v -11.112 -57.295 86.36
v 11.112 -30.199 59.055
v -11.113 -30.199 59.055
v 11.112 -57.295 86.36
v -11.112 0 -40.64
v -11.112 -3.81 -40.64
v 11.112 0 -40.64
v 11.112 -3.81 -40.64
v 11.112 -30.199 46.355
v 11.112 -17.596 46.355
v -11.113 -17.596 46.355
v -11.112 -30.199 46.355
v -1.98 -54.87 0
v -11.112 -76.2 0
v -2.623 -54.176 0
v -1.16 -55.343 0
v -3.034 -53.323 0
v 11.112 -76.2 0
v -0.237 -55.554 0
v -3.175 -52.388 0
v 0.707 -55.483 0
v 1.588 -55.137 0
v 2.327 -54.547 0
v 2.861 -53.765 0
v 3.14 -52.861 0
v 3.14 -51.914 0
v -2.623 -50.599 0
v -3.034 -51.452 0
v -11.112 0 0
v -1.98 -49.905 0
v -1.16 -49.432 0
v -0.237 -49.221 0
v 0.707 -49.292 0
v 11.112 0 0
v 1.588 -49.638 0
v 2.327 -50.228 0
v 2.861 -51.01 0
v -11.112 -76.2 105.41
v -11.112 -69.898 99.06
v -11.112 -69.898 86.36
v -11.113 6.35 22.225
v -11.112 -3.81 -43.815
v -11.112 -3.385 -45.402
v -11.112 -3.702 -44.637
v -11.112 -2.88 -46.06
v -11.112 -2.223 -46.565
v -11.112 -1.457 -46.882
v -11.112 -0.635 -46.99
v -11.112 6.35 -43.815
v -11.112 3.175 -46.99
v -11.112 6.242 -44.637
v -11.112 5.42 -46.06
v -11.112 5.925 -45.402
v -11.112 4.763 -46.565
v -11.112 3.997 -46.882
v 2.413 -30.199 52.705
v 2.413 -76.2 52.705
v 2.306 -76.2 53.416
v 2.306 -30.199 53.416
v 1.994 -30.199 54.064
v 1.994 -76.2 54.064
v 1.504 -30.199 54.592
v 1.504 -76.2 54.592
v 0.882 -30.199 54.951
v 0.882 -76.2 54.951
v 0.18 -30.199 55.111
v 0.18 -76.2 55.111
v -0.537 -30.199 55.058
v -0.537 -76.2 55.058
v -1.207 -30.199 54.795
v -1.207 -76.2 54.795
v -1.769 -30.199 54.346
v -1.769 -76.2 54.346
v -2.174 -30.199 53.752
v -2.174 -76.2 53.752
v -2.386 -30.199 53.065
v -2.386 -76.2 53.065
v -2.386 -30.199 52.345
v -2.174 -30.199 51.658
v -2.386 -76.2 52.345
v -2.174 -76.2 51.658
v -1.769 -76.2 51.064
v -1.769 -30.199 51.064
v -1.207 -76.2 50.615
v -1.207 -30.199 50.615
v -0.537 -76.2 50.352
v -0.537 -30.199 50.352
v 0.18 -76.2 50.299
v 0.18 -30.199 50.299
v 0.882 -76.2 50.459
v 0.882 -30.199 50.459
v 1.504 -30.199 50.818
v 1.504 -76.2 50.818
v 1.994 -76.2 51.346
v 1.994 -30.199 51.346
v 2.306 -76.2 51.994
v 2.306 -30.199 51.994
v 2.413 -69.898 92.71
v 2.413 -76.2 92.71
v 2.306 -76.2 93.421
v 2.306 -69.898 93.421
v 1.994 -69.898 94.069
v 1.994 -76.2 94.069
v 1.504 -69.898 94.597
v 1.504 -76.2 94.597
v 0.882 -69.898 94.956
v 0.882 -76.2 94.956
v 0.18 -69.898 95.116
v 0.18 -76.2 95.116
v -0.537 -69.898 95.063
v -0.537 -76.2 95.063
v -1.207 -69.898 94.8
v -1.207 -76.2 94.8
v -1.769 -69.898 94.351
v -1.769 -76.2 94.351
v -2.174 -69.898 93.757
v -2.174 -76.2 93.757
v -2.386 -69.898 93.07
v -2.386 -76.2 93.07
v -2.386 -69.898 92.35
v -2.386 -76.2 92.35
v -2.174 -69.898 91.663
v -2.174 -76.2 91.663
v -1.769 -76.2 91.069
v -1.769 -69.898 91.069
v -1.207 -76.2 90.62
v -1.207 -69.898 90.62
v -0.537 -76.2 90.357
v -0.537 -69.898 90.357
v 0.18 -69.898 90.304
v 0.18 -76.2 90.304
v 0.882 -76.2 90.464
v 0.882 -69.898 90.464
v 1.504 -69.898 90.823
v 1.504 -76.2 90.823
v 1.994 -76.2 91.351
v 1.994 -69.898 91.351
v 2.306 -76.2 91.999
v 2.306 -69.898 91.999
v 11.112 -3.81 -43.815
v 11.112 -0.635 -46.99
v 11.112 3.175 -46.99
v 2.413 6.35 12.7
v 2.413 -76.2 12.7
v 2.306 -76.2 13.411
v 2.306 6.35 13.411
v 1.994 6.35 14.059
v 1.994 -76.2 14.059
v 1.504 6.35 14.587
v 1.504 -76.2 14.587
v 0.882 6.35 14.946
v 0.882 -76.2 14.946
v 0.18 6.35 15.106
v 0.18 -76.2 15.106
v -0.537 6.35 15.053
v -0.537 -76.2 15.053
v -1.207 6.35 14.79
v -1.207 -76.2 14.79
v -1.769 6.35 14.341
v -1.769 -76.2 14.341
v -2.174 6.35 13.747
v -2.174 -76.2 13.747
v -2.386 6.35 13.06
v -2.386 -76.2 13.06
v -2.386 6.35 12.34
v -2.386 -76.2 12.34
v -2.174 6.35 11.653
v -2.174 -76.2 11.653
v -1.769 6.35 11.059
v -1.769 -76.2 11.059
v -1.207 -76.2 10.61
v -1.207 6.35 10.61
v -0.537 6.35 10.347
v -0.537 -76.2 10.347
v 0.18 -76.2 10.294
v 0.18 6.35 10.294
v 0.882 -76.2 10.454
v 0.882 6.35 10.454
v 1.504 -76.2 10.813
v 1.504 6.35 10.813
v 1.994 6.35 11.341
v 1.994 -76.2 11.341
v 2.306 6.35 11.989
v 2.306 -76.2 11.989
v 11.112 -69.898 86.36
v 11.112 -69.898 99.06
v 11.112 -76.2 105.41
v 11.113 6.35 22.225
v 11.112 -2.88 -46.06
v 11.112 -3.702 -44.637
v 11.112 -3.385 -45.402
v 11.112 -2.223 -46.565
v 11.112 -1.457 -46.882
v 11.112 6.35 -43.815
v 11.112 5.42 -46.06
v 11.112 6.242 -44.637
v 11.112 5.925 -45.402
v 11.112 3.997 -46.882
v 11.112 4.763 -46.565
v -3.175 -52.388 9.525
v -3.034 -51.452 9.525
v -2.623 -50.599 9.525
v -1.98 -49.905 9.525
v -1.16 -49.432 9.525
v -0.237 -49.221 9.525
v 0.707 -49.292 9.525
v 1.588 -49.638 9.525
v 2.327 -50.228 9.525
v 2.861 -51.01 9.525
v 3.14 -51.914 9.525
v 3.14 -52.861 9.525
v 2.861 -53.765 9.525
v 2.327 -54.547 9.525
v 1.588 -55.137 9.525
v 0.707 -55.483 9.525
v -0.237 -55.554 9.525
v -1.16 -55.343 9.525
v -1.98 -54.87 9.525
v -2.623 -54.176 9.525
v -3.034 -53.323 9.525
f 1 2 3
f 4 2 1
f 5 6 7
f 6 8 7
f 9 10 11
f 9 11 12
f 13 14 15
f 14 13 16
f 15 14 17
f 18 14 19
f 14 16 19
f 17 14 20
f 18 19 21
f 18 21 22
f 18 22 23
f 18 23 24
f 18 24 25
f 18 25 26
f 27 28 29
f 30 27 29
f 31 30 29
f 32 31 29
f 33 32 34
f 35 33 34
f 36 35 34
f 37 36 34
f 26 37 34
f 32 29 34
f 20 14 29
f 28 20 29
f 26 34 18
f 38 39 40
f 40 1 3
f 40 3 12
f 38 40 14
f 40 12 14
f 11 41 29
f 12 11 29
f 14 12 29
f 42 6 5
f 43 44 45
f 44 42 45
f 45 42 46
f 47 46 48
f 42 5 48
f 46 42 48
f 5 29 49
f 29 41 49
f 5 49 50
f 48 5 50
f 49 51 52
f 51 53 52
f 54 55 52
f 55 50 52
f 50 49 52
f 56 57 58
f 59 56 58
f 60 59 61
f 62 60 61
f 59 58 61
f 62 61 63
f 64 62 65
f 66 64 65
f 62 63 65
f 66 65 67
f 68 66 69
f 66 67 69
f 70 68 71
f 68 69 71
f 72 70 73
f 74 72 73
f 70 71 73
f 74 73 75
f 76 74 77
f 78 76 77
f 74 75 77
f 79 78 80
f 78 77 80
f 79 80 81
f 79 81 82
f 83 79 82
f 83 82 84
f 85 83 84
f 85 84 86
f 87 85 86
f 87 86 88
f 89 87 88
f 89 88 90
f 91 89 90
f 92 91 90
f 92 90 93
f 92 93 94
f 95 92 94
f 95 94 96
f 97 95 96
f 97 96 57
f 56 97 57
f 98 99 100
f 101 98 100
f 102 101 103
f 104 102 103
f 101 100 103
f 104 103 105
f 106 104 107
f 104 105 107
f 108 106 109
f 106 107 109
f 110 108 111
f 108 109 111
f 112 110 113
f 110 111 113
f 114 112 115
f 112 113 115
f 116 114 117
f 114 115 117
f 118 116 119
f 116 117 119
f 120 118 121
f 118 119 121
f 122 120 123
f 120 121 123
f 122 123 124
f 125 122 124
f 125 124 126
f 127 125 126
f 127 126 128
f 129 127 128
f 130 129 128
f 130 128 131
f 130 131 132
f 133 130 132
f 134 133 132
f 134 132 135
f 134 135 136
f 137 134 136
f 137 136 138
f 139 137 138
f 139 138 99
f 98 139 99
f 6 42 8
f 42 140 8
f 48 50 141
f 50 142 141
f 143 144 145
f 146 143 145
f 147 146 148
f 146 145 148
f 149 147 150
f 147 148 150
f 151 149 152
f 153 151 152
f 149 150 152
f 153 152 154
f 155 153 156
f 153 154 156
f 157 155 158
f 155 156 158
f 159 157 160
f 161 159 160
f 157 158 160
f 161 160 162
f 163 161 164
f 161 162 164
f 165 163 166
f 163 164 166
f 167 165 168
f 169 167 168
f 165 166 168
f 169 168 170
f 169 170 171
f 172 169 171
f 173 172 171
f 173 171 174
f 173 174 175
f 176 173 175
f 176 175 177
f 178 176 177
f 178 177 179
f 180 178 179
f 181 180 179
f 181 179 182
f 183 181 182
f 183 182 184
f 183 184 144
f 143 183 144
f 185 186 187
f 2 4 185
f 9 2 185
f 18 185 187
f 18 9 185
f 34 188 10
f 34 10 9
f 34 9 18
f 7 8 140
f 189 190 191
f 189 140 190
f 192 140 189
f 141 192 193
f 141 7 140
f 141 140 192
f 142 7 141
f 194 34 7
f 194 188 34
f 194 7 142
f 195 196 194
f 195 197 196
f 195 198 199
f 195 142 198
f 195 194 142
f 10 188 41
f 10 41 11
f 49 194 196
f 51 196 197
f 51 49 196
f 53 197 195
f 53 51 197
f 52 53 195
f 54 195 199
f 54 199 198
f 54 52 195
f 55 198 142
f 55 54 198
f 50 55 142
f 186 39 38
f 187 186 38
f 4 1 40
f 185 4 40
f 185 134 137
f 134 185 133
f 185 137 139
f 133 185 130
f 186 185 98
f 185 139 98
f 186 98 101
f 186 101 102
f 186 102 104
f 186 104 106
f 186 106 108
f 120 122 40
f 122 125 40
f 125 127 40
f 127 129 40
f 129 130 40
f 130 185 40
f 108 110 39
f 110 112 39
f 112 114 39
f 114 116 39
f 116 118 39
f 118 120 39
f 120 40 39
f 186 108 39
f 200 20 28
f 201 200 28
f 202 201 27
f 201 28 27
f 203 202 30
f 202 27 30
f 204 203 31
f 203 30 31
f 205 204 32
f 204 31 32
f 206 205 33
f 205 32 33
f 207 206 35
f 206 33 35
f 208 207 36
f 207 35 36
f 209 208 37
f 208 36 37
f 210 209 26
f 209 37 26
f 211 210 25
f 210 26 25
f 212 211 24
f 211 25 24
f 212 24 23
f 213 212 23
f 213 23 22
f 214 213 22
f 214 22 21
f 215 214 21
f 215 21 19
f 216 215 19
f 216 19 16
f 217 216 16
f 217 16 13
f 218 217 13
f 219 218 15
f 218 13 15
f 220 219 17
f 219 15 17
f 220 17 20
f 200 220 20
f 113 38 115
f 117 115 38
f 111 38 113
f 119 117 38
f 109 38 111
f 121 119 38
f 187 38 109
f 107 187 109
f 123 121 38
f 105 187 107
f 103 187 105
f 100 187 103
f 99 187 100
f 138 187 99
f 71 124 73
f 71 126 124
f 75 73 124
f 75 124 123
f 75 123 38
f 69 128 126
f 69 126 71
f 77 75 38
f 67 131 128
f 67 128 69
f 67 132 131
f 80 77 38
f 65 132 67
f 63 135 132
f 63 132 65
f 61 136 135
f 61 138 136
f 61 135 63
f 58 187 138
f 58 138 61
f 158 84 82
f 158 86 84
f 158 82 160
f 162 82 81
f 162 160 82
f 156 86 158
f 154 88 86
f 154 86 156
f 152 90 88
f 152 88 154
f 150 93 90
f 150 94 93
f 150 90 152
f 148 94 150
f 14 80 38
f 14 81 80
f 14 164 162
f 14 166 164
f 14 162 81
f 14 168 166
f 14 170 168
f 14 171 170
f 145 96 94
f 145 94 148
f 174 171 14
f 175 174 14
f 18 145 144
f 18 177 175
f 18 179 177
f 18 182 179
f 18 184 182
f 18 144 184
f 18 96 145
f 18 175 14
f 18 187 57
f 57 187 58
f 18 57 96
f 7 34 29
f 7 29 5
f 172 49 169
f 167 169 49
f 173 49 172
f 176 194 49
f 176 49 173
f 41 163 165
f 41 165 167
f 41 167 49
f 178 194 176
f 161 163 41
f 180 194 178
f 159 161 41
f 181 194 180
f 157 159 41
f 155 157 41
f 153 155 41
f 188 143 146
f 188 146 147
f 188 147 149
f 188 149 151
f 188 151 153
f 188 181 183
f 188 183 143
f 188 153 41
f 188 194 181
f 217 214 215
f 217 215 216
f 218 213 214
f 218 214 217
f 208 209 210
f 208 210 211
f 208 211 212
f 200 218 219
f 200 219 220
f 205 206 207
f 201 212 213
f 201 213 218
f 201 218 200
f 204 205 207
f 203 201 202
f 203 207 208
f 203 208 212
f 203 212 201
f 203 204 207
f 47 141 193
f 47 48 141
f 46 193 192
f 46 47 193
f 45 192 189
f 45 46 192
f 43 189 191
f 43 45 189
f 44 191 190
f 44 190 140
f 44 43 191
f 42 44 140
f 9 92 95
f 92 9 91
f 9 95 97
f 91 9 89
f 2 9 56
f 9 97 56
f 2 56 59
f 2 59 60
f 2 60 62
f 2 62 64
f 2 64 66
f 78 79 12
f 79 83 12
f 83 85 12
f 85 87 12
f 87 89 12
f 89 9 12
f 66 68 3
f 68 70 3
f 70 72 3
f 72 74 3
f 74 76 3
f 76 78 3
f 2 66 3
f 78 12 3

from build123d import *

# Parameters (mm, degrees)
BOSS_EXTRUDE1_DEPTH     = 11.1125
SKETCH3_W               = 22.225
SKETCH3_H               = 22.225
BOSS_EXTRUDE2_DEPTH     = 76.2
BOSS_EXTRUDE3_DEPTH     = 22.225
SKETCH6_R               = 2.413
CUT_EXTRUDE1_DEPTH      = 83.55
CUT_EXTRUDE2_DEPTH      = 1
CUT_EXTRUDE2_DEPTH_BACK = 23.225
FILLET1_R               = 3.175
SKETCH8_R               = 3.175
CUT_EXTRUDE3_DEPTH      = 9.525


with BuildPart() as part:
    # Sketch1 → Boss-Extrude1 (new body, symmetric)
    with BuildSketch(Plane(origin=(0, 0, 0), x_dir=(0, 0, -1), z_dir=(1, 0, 0))):
        Polygon((-22.225, 6.35), (0, 6.35), (46.99, 6.35), (46.99, -3.81), (40.64, -3.81), (40.64, 0), (0, 0), (-22.225, 0), align=None)
    extrude(amount=BOSS_EXTRUDE1_DEPTH, both=True)

    # Sketch3 → Boss-Extrude2 (add)
    with BuildSketch(Plane.XZ):
        with Locations((0, 11.1125)):
            Rectangle(SKETCH3_W, SKETCH3_H)
    extrude(amount=BOSS_EXTRUDE2_DEPTH)

    # Sketch5 → Boss-Extrude3 (add)
    with BuildSketch(Plane(origin=(11.1125, 0, 0), x_dir=(0, 0, -1), z_dir=(1, 0, 0))):
        Polygon((-22.225, 6.35), (-105.41, -76.2), (-22.225, -76.2), align=None)
    extrude(amount=-BOSS_EXTRUDE3_DEPTH)

    # Sketch6 → Cut-Extrude1 (cut, through all)
    with BuildSketch(Plane.XZ.offset(76.2)):
        with Locations((0, 92.71)):
            Circle(SKETCH6_R)
        with Locations((0, 12.7)):
            Circle(SKETCH6_R)
        with Locations((0, 52.705)):
            Circle(SKETCH6_R)
    extrude(amount=-CUT_EXTRUDE1_DEPTH, mode=Mode.SUBTRACT)

    # Sketch7 → Cut-Extrude2 (cut, two sides)
    with BuildSketch(Plane.ZY.offset(11.1125)) as cut_extrude2_sk:
        Polygon((46.355, -17.595801527), (46.355, -30.198854962), (59.055, -30.198854962), align=None)
        Polygon((86.36, -57.295419847), (86.36, -69.898473282), (99.06, -69.898473282), align=None)
    extrude(amount=CUT_EXTRUDE2_DEPTH, mode=Mode.SUBTRACT)
    extrude(cut_extrude2_sk.sketch, amount=-CUT_EXTRUDE2_DEPTH_BACK, mode=Mode.SUBTRACT)

    # Fillet1
    fillet1_edges = [part.edges().sort_by_distance(p)[0] for p in [
        (0, 6.35, -46.99),
        (0, -3.81, -46.99),
    ]]
    fillet(fillet1_edges, radius=FILLET1_R)

    # Sketch8 → Cut-Extrude3 (cut)
    with BuildSketch(Plane(origin=(0, 0, 0), x_dir=(-1, 0, 0), z_dir=(0, 0, -1))):
        with Locations((0, -52.3875)):
            Circle(SKETCH8_R)
    extrude(amount=-CUT_EXTRUDE3_DEPTH, mode=Mode.SUBTRACT)


solid = part.part
